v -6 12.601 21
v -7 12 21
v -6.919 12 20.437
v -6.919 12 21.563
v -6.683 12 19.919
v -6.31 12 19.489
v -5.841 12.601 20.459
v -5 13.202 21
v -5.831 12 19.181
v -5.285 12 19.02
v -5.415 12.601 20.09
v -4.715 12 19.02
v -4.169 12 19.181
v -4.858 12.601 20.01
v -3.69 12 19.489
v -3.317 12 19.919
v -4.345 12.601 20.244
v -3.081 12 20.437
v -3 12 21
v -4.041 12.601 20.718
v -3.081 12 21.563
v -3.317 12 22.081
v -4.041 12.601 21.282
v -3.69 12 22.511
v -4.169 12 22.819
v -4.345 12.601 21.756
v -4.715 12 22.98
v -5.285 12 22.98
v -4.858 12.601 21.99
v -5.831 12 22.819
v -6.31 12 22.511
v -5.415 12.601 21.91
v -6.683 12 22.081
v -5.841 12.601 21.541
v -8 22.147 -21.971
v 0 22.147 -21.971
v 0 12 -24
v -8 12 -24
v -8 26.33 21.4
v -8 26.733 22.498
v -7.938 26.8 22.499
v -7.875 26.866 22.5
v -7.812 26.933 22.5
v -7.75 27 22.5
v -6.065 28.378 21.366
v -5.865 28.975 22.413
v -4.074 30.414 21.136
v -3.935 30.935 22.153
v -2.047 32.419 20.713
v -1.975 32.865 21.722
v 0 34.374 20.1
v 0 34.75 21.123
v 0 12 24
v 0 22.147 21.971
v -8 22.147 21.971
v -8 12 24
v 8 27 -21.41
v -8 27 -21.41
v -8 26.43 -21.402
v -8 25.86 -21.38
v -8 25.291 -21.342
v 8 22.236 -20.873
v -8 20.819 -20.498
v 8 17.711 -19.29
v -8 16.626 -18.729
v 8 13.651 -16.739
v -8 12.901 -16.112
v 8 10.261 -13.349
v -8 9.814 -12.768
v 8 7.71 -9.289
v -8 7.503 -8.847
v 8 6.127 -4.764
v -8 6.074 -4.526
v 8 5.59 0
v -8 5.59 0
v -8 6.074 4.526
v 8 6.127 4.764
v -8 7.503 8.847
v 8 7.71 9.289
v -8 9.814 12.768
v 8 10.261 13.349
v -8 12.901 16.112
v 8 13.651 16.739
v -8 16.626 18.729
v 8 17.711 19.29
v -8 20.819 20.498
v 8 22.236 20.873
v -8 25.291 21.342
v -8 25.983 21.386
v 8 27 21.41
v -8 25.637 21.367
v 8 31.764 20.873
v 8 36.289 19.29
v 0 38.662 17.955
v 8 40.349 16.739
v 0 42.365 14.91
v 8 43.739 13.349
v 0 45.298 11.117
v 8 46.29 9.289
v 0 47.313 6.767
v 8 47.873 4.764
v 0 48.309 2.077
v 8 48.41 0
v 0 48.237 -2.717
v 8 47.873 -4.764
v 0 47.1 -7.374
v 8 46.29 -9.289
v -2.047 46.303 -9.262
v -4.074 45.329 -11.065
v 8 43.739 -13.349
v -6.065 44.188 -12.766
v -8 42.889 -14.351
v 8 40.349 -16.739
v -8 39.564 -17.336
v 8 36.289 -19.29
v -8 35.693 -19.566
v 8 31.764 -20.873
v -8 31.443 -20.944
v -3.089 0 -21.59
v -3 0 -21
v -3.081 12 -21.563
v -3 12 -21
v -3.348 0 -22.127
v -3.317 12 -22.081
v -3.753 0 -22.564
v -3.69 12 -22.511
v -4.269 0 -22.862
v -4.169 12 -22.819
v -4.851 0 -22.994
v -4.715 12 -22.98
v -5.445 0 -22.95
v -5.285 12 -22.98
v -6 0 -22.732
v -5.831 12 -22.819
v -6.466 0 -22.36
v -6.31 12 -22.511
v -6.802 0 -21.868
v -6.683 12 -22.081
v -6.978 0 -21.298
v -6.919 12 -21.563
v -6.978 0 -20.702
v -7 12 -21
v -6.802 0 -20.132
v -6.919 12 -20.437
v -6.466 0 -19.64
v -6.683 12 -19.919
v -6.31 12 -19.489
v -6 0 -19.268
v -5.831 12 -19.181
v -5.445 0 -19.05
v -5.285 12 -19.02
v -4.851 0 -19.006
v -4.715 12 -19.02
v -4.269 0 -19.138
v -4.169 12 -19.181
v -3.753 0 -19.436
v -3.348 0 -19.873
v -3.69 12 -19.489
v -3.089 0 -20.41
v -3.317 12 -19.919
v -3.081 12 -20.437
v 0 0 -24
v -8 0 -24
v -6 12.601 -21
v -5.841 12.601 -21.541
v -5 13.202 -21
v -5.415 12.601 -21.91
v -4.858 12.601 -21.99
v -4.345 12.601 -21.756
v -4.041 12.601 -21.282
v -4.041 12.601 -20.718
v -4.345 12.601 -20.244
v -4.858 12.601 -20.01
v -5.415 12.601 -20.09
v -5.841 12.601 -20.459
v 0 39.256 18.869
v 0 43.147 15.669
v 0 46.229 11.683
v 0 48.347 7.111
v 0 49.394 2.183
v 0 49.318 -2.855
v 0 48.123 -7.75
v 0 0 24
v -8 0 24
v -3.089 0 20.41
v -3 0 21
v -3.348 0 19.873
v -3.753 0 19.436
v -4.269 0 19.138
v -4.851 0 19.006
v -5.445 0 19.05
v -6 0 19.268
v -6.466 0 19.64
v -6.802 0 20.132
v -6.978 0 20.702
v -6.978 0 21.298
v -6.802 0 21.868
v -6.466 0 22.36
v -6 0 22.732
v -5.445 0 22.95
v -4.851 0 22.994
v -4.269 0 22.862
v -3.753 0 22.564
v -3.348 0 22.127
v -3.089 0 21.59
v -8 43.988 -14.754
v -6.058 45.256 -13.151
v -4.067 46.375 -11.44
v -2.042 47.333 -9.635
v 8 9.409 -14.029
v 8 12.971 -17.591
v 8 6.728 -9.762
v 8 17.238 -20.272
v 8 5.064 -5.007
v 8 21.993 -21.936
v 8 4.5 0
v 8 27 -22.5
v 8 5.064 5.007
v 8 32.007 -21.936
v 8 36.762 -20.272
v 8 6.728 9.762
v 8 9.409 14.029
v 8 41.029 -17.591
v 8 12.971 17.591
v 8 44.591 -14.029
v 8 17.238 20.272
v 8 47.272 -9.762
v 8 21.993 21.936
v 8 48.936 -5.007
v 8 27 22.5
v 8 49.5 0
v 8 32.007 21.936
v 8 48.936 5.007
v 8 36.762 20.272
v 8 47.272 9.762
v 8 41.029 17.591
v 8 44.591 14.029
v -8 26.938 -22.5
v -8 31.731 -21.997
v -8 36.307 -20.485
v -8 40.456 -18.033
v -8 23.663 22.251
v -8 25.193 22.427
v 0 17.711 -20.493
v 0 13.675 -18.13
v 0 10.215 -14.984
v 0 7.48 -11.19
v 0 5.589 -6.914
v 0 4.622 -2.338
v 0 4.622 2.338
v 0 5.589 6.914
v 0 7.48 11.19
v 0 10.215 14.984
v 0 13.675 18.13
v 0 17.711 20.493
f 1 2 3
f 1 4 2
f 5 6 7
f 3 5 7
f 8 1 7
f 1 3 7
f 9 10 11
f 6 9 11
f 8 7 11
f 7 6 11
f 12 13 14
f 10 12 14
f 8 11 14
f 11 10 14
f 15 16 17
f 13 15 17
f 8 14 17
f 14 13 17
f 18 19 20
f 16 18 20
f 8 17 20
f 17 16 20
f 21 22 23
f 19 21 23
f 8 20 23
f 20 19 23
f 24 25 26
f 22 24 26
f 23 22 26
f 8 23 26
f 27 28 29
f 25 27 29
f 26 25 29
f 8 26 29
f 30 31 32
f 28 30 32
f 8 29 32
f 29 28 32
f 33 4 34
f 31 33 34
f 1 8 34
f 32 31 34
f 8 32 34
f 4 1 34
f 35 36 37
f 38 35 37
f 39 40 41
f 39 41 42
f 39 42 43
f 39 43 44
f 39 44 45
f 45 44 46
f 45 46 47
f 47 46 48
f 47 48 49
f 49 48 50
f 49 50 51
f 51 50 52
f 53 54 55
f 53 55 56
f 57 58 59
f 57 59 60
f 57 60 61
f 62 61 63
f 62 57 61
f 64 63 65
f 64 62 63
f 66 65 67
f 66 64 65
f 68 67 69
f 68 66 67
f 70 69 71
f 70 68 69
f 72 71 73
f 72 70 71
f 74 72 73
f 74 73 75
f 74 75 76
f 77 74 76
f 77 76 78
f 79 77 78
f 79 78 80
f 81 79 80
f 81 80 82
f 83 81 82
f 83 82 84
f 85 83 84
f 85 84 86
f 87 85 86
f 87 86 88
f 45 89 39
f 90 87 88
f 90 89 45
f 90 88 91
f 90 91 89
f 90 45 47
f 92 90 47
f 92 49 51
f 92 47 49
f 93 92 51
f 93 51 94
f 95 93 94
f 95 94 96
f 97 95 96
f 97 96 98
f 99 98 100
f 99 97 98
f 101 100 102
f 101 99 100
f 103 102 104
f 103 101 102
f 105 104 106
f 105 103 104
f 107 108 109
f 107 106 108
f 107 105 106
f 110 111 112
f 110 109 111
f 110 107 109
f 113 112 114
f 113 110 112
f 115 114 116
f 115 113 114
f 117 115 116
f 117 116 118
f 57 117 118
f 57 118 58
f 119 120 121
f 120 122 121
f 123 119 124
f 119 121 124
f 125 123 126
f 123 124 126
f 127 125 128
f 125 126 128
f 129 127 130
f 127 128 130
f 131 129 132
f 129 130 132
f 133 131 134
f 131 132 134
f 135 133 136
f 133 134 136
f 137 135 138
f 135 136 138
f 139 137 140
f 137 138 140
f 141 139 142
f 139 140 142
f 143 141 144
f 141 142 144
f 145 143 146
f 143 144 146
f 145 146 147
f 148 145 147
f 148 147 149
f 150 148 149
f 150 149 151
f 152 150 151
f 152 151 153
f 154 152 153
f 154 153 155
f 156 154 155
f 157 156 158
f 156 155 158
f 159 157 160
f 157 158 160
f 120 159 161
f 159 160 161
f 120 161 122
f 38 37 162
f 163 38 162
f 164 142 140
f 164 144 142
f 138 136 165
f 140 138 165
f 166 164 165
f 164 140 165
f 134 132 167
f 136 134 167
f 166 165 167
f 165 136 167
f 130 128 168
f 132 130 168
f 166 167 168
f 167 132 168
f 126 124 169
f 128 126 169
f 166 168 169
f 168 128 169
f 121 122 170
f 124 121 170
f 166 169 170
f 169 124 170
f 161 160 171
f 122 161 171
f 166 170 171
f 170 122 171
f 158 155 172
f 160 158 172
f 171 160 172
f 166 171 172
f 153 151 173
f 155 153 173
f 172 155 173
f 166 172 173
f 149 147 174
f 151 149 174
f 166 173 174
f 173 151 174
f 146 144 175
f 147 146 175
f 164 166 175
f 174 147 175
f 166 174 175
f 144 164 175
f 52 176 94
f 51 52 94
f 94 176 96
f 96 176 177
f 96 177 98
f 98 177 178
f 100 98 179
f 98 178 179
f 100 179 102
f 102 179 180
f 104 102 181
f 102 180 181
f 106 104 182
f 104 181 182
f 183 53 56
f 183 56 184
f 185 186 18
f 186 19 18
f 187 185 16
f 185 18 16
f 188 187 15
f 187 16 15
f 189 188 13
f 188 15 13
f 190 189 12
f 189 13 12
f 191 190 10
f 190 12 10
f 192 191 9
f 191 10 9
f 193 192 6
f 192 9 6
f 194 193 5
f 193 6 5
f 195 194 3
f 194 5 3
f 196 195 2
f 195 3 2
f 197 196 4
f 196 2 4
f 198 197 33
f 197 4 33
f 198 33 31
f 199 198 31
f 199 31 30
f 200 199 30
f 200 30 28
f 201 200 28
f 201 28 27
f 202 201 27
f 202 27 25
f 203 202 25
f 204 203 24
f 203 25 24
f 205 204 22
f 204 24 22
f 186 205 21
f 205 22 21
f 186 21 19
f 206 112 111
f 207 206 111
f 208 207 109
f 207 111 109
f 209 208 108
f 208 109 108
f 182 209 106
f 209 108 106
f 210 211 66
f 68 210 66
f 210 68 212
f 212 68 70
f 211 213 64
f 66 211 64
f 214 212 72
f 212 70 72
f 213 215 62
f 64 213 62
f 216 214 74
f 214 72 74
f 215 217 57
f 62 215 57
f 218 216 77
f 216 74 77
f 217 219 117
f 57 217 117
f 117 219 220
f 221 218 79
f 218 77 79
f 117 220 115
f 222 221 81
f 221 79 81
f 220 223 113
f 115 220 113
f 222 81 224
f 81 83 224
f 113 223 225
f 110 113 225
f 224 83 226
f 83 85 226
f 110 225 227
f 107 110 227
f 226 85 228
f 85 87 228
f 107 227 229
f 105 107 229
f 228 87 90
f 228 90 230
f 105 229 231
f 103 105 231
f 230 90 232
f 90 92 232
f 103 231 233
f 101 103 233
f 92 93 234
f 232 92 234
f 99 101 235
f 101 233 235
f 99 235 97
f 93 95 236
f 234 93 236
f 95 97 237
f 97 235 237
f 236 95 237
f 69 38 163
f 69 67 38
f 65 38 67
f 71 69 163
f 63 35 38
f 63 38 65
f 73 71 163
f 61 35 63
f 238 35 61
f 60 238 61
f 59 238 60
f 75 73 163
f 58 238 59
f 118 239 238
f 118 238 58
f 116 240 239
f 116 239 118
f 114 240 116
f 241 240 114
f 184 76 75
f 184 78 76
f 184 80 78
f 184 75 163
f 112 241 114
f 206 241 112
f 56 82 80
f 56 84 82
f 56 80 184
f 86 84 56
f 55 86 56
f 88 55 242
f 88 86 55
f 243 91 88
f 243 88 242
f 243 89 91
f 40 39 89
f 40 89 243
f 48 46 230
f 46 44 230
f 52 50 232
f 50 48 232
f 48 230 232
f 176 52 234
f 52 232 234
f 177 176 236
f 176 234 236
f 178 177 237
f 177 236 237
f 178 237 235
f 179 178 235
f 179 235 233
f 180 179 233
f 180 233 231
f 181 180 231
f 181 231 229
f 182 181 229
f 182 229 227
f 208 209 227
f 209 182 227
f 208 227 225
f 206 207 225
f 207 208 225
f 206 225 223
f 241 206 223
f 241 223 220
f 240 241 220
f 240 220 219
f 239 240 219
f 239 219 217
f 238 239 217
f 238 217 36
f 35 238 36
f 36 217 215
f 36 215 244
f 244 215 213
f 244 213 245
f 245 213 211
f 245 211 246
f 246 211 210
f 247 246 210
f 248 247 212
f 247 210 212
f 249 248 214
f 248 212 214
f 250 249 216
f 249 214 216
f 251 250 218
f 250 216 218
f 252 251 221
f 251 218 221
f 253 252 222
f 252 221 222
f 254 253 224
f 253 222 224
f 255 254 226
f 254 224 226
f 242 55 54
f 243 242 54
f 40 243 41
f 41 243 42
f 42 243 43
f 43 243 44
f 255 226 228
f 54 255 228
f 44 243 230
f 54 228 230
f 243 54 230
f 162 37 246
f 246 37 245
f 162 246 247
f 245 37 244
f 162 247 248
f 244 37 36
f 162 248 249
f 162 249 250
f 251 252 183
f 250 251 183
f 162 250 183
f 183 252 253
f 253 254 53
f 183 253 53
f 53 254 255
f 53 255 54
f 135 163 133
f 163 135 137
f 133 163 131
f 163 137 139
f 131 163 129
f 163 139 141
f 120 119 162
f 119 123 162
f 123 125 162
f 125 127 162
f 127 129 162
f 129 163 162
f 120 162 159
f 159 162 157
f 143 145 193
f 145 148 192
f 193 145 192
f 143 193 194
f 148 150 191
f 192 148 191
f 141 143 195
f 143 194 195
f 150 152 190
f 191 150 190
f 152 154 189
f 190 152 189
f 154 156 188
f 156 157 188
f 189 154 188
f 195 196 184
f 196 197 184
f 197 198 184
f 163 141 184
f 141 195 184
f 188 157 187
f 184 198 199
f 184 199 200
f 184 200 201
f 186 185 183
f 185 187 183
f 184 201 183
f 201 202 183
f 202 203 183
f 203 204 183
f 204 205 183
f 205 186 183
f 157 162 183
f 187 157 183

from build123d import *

# Parameters (mm, degrees)
EXTRUDE_1_DEPTH     = 8
MM_1_D              = 4
MM_1_DEPTH          = 12
MM_1_TIP            = 1.201721238
EXTRUDE_START       = -16
SKETCH_5_R          = 22.5
SKETCH_5_R_2        = 21.41
EXTRUDE_2_DEPTH     = 16
CUT_EXTRUDE_1_DEPTH = 8
CHAMFER_1_SIZE      = 8


with BuildPart() as part:
    # 草图1 → 凸台-拉伸1 (new body)
    with BuildSketch(Plane(origin=(0, 0, 0), x_dir=(0, 0, -1), z_dir=(1, 0, 0))):
        with BuildLine():
            Line((0, 0), (0, 5.59))
            ThreePointArc((0, 5.59), (-14.522523536, 11.268362763), (-21.34171621, 25.291418949))
            Line((-21.34171621, 25.291418949), (-24, 12))
            Line((-24, 12), (-24, 0))
            Line((-24, 0), (0, 0))
        make_face()
    extrude_1 = extrude(amount=-EXTRUDE_1_DEPTH)

    # 镜向1: 凸台-拉伸1 across plane
    add(extrude_1.mirror(Plane(origin=(0, 0, 0), x_dir=(1, 0, 0), z_dir=(0, 0, -1))))

    # 大小mm 暗销孔1
    with Locations(Plane(origin=(0, 0, 0), x_dir=(-1, 0, 0), z_dir=(0, -1, 0))):
        with Locations((5, 21), (5, -21)):
            Hole(MM_1_D / 2, depth=MM_1_DEPTH)
            with Locations((0, 0, -(MM_1_DEPTH + MM_1_TIP / 2))):  # 118° drill point
                Cone(0, MM_1_D / 2, MM_1_TIP, mode=Mode.SUBTRACT)

    # 草图5 → 凸台-拉伸2 (add)
    with BuildSketch(Plane.ZY.offset(8).offset(EXTRUDE_START)):
        with Locations((0, 27)):
            Circle(SKETCH_5_R)
        with Locations(Location((0, 27, 0), (0, 0, 180))):
            Circle(SKETCH_5_R_2, mode=Mode.SUBTRACT)
    extrude(amount=EXTRUDE_2_DEPTH)

    # 草图6 → 切除-拉伸1 (cut)
    with BuildSketch(Plane.ZY.offset(8)):
        Polygon((0, 27), (-12.808653102, 61.912636137), (29.307523189, 37.752264491), align=None)
    extrude(amount=-CUT_EXTRUDE_1_DEPTH, mode=Mode.SUBTRACT)

    # 倒角1
    # the kernel refuses this chamfer: 8 mm, written as the material it takes off along each edge
    with BuildSketch(Plane(origin=(-8, 41.835747499, 40.437901637), x_dir=(-0.027495876610586258, -0.938457441934671, 0.3442987168823741), z_dir=(0, -0.3444289396397119, -0.9388123910231819))) as chamfer_1_piece_1_section:
        Polygon((CHAMFER_1_SIZE * 0.999621916911, -CHAMFER_1_SIZE * 0.0274958766106), (-CHAMFER_1_SIZE * 0.0274958766106, -CHAMFER_1_SIZE * 0.999621916911), (0, 0), align=None)
    chamfer_1_piece_1 = extrude(amount=42.236927807, mode=Mode.PRIVATE)
    chamfer_1_piece_1 = split(chamfer_1_piece_1, bisect_by=Plane(origin=(0, 32.080437257, 21.522032065), z_dir=(-1, 0, 0)), keep=Keep.TOP, mode=Mode.PRIVATE)
    add(chamfer_1_piece_1, mode=Mode.SUBTRACT)
    with BuildSketch(Plane(origin=(-8, 27.785350453, -0.288127241), x_dir=(-0.02749587661058627, -0.34429871688237407, -0.9384574419346708), z_dir=(0, 0.9388123910231819, -0.34442893963971194))) as chamfer_1_piece_2_section:
        Polygon((CHAMFER_1_SIZE * 0.999621916911, -CHAMFER_1_SIZE * 0.0274958766106), (-CHAMFER_1_SIZE * 0.0274958766106, -CHAMFER_1_SIZE * 0.999621916911), (0, 0), align=None)
    chamfer_1_piece_2 = extrude(amount=42.236927807, mode=Mode.PRIVATE)
    chamfer_1_piece_2 = split(chamfer_1_piece_2, bisect_by=Plane(origin=(0, 46.701220025, -10.043437483), z_dir=(-1, 0, 0)), keep=Keep.TOP, mode=Mode.PRIVATE)
    add(chamfer_1_piece_2, mode=Mode.SUBTRACT)


solid = part.part
